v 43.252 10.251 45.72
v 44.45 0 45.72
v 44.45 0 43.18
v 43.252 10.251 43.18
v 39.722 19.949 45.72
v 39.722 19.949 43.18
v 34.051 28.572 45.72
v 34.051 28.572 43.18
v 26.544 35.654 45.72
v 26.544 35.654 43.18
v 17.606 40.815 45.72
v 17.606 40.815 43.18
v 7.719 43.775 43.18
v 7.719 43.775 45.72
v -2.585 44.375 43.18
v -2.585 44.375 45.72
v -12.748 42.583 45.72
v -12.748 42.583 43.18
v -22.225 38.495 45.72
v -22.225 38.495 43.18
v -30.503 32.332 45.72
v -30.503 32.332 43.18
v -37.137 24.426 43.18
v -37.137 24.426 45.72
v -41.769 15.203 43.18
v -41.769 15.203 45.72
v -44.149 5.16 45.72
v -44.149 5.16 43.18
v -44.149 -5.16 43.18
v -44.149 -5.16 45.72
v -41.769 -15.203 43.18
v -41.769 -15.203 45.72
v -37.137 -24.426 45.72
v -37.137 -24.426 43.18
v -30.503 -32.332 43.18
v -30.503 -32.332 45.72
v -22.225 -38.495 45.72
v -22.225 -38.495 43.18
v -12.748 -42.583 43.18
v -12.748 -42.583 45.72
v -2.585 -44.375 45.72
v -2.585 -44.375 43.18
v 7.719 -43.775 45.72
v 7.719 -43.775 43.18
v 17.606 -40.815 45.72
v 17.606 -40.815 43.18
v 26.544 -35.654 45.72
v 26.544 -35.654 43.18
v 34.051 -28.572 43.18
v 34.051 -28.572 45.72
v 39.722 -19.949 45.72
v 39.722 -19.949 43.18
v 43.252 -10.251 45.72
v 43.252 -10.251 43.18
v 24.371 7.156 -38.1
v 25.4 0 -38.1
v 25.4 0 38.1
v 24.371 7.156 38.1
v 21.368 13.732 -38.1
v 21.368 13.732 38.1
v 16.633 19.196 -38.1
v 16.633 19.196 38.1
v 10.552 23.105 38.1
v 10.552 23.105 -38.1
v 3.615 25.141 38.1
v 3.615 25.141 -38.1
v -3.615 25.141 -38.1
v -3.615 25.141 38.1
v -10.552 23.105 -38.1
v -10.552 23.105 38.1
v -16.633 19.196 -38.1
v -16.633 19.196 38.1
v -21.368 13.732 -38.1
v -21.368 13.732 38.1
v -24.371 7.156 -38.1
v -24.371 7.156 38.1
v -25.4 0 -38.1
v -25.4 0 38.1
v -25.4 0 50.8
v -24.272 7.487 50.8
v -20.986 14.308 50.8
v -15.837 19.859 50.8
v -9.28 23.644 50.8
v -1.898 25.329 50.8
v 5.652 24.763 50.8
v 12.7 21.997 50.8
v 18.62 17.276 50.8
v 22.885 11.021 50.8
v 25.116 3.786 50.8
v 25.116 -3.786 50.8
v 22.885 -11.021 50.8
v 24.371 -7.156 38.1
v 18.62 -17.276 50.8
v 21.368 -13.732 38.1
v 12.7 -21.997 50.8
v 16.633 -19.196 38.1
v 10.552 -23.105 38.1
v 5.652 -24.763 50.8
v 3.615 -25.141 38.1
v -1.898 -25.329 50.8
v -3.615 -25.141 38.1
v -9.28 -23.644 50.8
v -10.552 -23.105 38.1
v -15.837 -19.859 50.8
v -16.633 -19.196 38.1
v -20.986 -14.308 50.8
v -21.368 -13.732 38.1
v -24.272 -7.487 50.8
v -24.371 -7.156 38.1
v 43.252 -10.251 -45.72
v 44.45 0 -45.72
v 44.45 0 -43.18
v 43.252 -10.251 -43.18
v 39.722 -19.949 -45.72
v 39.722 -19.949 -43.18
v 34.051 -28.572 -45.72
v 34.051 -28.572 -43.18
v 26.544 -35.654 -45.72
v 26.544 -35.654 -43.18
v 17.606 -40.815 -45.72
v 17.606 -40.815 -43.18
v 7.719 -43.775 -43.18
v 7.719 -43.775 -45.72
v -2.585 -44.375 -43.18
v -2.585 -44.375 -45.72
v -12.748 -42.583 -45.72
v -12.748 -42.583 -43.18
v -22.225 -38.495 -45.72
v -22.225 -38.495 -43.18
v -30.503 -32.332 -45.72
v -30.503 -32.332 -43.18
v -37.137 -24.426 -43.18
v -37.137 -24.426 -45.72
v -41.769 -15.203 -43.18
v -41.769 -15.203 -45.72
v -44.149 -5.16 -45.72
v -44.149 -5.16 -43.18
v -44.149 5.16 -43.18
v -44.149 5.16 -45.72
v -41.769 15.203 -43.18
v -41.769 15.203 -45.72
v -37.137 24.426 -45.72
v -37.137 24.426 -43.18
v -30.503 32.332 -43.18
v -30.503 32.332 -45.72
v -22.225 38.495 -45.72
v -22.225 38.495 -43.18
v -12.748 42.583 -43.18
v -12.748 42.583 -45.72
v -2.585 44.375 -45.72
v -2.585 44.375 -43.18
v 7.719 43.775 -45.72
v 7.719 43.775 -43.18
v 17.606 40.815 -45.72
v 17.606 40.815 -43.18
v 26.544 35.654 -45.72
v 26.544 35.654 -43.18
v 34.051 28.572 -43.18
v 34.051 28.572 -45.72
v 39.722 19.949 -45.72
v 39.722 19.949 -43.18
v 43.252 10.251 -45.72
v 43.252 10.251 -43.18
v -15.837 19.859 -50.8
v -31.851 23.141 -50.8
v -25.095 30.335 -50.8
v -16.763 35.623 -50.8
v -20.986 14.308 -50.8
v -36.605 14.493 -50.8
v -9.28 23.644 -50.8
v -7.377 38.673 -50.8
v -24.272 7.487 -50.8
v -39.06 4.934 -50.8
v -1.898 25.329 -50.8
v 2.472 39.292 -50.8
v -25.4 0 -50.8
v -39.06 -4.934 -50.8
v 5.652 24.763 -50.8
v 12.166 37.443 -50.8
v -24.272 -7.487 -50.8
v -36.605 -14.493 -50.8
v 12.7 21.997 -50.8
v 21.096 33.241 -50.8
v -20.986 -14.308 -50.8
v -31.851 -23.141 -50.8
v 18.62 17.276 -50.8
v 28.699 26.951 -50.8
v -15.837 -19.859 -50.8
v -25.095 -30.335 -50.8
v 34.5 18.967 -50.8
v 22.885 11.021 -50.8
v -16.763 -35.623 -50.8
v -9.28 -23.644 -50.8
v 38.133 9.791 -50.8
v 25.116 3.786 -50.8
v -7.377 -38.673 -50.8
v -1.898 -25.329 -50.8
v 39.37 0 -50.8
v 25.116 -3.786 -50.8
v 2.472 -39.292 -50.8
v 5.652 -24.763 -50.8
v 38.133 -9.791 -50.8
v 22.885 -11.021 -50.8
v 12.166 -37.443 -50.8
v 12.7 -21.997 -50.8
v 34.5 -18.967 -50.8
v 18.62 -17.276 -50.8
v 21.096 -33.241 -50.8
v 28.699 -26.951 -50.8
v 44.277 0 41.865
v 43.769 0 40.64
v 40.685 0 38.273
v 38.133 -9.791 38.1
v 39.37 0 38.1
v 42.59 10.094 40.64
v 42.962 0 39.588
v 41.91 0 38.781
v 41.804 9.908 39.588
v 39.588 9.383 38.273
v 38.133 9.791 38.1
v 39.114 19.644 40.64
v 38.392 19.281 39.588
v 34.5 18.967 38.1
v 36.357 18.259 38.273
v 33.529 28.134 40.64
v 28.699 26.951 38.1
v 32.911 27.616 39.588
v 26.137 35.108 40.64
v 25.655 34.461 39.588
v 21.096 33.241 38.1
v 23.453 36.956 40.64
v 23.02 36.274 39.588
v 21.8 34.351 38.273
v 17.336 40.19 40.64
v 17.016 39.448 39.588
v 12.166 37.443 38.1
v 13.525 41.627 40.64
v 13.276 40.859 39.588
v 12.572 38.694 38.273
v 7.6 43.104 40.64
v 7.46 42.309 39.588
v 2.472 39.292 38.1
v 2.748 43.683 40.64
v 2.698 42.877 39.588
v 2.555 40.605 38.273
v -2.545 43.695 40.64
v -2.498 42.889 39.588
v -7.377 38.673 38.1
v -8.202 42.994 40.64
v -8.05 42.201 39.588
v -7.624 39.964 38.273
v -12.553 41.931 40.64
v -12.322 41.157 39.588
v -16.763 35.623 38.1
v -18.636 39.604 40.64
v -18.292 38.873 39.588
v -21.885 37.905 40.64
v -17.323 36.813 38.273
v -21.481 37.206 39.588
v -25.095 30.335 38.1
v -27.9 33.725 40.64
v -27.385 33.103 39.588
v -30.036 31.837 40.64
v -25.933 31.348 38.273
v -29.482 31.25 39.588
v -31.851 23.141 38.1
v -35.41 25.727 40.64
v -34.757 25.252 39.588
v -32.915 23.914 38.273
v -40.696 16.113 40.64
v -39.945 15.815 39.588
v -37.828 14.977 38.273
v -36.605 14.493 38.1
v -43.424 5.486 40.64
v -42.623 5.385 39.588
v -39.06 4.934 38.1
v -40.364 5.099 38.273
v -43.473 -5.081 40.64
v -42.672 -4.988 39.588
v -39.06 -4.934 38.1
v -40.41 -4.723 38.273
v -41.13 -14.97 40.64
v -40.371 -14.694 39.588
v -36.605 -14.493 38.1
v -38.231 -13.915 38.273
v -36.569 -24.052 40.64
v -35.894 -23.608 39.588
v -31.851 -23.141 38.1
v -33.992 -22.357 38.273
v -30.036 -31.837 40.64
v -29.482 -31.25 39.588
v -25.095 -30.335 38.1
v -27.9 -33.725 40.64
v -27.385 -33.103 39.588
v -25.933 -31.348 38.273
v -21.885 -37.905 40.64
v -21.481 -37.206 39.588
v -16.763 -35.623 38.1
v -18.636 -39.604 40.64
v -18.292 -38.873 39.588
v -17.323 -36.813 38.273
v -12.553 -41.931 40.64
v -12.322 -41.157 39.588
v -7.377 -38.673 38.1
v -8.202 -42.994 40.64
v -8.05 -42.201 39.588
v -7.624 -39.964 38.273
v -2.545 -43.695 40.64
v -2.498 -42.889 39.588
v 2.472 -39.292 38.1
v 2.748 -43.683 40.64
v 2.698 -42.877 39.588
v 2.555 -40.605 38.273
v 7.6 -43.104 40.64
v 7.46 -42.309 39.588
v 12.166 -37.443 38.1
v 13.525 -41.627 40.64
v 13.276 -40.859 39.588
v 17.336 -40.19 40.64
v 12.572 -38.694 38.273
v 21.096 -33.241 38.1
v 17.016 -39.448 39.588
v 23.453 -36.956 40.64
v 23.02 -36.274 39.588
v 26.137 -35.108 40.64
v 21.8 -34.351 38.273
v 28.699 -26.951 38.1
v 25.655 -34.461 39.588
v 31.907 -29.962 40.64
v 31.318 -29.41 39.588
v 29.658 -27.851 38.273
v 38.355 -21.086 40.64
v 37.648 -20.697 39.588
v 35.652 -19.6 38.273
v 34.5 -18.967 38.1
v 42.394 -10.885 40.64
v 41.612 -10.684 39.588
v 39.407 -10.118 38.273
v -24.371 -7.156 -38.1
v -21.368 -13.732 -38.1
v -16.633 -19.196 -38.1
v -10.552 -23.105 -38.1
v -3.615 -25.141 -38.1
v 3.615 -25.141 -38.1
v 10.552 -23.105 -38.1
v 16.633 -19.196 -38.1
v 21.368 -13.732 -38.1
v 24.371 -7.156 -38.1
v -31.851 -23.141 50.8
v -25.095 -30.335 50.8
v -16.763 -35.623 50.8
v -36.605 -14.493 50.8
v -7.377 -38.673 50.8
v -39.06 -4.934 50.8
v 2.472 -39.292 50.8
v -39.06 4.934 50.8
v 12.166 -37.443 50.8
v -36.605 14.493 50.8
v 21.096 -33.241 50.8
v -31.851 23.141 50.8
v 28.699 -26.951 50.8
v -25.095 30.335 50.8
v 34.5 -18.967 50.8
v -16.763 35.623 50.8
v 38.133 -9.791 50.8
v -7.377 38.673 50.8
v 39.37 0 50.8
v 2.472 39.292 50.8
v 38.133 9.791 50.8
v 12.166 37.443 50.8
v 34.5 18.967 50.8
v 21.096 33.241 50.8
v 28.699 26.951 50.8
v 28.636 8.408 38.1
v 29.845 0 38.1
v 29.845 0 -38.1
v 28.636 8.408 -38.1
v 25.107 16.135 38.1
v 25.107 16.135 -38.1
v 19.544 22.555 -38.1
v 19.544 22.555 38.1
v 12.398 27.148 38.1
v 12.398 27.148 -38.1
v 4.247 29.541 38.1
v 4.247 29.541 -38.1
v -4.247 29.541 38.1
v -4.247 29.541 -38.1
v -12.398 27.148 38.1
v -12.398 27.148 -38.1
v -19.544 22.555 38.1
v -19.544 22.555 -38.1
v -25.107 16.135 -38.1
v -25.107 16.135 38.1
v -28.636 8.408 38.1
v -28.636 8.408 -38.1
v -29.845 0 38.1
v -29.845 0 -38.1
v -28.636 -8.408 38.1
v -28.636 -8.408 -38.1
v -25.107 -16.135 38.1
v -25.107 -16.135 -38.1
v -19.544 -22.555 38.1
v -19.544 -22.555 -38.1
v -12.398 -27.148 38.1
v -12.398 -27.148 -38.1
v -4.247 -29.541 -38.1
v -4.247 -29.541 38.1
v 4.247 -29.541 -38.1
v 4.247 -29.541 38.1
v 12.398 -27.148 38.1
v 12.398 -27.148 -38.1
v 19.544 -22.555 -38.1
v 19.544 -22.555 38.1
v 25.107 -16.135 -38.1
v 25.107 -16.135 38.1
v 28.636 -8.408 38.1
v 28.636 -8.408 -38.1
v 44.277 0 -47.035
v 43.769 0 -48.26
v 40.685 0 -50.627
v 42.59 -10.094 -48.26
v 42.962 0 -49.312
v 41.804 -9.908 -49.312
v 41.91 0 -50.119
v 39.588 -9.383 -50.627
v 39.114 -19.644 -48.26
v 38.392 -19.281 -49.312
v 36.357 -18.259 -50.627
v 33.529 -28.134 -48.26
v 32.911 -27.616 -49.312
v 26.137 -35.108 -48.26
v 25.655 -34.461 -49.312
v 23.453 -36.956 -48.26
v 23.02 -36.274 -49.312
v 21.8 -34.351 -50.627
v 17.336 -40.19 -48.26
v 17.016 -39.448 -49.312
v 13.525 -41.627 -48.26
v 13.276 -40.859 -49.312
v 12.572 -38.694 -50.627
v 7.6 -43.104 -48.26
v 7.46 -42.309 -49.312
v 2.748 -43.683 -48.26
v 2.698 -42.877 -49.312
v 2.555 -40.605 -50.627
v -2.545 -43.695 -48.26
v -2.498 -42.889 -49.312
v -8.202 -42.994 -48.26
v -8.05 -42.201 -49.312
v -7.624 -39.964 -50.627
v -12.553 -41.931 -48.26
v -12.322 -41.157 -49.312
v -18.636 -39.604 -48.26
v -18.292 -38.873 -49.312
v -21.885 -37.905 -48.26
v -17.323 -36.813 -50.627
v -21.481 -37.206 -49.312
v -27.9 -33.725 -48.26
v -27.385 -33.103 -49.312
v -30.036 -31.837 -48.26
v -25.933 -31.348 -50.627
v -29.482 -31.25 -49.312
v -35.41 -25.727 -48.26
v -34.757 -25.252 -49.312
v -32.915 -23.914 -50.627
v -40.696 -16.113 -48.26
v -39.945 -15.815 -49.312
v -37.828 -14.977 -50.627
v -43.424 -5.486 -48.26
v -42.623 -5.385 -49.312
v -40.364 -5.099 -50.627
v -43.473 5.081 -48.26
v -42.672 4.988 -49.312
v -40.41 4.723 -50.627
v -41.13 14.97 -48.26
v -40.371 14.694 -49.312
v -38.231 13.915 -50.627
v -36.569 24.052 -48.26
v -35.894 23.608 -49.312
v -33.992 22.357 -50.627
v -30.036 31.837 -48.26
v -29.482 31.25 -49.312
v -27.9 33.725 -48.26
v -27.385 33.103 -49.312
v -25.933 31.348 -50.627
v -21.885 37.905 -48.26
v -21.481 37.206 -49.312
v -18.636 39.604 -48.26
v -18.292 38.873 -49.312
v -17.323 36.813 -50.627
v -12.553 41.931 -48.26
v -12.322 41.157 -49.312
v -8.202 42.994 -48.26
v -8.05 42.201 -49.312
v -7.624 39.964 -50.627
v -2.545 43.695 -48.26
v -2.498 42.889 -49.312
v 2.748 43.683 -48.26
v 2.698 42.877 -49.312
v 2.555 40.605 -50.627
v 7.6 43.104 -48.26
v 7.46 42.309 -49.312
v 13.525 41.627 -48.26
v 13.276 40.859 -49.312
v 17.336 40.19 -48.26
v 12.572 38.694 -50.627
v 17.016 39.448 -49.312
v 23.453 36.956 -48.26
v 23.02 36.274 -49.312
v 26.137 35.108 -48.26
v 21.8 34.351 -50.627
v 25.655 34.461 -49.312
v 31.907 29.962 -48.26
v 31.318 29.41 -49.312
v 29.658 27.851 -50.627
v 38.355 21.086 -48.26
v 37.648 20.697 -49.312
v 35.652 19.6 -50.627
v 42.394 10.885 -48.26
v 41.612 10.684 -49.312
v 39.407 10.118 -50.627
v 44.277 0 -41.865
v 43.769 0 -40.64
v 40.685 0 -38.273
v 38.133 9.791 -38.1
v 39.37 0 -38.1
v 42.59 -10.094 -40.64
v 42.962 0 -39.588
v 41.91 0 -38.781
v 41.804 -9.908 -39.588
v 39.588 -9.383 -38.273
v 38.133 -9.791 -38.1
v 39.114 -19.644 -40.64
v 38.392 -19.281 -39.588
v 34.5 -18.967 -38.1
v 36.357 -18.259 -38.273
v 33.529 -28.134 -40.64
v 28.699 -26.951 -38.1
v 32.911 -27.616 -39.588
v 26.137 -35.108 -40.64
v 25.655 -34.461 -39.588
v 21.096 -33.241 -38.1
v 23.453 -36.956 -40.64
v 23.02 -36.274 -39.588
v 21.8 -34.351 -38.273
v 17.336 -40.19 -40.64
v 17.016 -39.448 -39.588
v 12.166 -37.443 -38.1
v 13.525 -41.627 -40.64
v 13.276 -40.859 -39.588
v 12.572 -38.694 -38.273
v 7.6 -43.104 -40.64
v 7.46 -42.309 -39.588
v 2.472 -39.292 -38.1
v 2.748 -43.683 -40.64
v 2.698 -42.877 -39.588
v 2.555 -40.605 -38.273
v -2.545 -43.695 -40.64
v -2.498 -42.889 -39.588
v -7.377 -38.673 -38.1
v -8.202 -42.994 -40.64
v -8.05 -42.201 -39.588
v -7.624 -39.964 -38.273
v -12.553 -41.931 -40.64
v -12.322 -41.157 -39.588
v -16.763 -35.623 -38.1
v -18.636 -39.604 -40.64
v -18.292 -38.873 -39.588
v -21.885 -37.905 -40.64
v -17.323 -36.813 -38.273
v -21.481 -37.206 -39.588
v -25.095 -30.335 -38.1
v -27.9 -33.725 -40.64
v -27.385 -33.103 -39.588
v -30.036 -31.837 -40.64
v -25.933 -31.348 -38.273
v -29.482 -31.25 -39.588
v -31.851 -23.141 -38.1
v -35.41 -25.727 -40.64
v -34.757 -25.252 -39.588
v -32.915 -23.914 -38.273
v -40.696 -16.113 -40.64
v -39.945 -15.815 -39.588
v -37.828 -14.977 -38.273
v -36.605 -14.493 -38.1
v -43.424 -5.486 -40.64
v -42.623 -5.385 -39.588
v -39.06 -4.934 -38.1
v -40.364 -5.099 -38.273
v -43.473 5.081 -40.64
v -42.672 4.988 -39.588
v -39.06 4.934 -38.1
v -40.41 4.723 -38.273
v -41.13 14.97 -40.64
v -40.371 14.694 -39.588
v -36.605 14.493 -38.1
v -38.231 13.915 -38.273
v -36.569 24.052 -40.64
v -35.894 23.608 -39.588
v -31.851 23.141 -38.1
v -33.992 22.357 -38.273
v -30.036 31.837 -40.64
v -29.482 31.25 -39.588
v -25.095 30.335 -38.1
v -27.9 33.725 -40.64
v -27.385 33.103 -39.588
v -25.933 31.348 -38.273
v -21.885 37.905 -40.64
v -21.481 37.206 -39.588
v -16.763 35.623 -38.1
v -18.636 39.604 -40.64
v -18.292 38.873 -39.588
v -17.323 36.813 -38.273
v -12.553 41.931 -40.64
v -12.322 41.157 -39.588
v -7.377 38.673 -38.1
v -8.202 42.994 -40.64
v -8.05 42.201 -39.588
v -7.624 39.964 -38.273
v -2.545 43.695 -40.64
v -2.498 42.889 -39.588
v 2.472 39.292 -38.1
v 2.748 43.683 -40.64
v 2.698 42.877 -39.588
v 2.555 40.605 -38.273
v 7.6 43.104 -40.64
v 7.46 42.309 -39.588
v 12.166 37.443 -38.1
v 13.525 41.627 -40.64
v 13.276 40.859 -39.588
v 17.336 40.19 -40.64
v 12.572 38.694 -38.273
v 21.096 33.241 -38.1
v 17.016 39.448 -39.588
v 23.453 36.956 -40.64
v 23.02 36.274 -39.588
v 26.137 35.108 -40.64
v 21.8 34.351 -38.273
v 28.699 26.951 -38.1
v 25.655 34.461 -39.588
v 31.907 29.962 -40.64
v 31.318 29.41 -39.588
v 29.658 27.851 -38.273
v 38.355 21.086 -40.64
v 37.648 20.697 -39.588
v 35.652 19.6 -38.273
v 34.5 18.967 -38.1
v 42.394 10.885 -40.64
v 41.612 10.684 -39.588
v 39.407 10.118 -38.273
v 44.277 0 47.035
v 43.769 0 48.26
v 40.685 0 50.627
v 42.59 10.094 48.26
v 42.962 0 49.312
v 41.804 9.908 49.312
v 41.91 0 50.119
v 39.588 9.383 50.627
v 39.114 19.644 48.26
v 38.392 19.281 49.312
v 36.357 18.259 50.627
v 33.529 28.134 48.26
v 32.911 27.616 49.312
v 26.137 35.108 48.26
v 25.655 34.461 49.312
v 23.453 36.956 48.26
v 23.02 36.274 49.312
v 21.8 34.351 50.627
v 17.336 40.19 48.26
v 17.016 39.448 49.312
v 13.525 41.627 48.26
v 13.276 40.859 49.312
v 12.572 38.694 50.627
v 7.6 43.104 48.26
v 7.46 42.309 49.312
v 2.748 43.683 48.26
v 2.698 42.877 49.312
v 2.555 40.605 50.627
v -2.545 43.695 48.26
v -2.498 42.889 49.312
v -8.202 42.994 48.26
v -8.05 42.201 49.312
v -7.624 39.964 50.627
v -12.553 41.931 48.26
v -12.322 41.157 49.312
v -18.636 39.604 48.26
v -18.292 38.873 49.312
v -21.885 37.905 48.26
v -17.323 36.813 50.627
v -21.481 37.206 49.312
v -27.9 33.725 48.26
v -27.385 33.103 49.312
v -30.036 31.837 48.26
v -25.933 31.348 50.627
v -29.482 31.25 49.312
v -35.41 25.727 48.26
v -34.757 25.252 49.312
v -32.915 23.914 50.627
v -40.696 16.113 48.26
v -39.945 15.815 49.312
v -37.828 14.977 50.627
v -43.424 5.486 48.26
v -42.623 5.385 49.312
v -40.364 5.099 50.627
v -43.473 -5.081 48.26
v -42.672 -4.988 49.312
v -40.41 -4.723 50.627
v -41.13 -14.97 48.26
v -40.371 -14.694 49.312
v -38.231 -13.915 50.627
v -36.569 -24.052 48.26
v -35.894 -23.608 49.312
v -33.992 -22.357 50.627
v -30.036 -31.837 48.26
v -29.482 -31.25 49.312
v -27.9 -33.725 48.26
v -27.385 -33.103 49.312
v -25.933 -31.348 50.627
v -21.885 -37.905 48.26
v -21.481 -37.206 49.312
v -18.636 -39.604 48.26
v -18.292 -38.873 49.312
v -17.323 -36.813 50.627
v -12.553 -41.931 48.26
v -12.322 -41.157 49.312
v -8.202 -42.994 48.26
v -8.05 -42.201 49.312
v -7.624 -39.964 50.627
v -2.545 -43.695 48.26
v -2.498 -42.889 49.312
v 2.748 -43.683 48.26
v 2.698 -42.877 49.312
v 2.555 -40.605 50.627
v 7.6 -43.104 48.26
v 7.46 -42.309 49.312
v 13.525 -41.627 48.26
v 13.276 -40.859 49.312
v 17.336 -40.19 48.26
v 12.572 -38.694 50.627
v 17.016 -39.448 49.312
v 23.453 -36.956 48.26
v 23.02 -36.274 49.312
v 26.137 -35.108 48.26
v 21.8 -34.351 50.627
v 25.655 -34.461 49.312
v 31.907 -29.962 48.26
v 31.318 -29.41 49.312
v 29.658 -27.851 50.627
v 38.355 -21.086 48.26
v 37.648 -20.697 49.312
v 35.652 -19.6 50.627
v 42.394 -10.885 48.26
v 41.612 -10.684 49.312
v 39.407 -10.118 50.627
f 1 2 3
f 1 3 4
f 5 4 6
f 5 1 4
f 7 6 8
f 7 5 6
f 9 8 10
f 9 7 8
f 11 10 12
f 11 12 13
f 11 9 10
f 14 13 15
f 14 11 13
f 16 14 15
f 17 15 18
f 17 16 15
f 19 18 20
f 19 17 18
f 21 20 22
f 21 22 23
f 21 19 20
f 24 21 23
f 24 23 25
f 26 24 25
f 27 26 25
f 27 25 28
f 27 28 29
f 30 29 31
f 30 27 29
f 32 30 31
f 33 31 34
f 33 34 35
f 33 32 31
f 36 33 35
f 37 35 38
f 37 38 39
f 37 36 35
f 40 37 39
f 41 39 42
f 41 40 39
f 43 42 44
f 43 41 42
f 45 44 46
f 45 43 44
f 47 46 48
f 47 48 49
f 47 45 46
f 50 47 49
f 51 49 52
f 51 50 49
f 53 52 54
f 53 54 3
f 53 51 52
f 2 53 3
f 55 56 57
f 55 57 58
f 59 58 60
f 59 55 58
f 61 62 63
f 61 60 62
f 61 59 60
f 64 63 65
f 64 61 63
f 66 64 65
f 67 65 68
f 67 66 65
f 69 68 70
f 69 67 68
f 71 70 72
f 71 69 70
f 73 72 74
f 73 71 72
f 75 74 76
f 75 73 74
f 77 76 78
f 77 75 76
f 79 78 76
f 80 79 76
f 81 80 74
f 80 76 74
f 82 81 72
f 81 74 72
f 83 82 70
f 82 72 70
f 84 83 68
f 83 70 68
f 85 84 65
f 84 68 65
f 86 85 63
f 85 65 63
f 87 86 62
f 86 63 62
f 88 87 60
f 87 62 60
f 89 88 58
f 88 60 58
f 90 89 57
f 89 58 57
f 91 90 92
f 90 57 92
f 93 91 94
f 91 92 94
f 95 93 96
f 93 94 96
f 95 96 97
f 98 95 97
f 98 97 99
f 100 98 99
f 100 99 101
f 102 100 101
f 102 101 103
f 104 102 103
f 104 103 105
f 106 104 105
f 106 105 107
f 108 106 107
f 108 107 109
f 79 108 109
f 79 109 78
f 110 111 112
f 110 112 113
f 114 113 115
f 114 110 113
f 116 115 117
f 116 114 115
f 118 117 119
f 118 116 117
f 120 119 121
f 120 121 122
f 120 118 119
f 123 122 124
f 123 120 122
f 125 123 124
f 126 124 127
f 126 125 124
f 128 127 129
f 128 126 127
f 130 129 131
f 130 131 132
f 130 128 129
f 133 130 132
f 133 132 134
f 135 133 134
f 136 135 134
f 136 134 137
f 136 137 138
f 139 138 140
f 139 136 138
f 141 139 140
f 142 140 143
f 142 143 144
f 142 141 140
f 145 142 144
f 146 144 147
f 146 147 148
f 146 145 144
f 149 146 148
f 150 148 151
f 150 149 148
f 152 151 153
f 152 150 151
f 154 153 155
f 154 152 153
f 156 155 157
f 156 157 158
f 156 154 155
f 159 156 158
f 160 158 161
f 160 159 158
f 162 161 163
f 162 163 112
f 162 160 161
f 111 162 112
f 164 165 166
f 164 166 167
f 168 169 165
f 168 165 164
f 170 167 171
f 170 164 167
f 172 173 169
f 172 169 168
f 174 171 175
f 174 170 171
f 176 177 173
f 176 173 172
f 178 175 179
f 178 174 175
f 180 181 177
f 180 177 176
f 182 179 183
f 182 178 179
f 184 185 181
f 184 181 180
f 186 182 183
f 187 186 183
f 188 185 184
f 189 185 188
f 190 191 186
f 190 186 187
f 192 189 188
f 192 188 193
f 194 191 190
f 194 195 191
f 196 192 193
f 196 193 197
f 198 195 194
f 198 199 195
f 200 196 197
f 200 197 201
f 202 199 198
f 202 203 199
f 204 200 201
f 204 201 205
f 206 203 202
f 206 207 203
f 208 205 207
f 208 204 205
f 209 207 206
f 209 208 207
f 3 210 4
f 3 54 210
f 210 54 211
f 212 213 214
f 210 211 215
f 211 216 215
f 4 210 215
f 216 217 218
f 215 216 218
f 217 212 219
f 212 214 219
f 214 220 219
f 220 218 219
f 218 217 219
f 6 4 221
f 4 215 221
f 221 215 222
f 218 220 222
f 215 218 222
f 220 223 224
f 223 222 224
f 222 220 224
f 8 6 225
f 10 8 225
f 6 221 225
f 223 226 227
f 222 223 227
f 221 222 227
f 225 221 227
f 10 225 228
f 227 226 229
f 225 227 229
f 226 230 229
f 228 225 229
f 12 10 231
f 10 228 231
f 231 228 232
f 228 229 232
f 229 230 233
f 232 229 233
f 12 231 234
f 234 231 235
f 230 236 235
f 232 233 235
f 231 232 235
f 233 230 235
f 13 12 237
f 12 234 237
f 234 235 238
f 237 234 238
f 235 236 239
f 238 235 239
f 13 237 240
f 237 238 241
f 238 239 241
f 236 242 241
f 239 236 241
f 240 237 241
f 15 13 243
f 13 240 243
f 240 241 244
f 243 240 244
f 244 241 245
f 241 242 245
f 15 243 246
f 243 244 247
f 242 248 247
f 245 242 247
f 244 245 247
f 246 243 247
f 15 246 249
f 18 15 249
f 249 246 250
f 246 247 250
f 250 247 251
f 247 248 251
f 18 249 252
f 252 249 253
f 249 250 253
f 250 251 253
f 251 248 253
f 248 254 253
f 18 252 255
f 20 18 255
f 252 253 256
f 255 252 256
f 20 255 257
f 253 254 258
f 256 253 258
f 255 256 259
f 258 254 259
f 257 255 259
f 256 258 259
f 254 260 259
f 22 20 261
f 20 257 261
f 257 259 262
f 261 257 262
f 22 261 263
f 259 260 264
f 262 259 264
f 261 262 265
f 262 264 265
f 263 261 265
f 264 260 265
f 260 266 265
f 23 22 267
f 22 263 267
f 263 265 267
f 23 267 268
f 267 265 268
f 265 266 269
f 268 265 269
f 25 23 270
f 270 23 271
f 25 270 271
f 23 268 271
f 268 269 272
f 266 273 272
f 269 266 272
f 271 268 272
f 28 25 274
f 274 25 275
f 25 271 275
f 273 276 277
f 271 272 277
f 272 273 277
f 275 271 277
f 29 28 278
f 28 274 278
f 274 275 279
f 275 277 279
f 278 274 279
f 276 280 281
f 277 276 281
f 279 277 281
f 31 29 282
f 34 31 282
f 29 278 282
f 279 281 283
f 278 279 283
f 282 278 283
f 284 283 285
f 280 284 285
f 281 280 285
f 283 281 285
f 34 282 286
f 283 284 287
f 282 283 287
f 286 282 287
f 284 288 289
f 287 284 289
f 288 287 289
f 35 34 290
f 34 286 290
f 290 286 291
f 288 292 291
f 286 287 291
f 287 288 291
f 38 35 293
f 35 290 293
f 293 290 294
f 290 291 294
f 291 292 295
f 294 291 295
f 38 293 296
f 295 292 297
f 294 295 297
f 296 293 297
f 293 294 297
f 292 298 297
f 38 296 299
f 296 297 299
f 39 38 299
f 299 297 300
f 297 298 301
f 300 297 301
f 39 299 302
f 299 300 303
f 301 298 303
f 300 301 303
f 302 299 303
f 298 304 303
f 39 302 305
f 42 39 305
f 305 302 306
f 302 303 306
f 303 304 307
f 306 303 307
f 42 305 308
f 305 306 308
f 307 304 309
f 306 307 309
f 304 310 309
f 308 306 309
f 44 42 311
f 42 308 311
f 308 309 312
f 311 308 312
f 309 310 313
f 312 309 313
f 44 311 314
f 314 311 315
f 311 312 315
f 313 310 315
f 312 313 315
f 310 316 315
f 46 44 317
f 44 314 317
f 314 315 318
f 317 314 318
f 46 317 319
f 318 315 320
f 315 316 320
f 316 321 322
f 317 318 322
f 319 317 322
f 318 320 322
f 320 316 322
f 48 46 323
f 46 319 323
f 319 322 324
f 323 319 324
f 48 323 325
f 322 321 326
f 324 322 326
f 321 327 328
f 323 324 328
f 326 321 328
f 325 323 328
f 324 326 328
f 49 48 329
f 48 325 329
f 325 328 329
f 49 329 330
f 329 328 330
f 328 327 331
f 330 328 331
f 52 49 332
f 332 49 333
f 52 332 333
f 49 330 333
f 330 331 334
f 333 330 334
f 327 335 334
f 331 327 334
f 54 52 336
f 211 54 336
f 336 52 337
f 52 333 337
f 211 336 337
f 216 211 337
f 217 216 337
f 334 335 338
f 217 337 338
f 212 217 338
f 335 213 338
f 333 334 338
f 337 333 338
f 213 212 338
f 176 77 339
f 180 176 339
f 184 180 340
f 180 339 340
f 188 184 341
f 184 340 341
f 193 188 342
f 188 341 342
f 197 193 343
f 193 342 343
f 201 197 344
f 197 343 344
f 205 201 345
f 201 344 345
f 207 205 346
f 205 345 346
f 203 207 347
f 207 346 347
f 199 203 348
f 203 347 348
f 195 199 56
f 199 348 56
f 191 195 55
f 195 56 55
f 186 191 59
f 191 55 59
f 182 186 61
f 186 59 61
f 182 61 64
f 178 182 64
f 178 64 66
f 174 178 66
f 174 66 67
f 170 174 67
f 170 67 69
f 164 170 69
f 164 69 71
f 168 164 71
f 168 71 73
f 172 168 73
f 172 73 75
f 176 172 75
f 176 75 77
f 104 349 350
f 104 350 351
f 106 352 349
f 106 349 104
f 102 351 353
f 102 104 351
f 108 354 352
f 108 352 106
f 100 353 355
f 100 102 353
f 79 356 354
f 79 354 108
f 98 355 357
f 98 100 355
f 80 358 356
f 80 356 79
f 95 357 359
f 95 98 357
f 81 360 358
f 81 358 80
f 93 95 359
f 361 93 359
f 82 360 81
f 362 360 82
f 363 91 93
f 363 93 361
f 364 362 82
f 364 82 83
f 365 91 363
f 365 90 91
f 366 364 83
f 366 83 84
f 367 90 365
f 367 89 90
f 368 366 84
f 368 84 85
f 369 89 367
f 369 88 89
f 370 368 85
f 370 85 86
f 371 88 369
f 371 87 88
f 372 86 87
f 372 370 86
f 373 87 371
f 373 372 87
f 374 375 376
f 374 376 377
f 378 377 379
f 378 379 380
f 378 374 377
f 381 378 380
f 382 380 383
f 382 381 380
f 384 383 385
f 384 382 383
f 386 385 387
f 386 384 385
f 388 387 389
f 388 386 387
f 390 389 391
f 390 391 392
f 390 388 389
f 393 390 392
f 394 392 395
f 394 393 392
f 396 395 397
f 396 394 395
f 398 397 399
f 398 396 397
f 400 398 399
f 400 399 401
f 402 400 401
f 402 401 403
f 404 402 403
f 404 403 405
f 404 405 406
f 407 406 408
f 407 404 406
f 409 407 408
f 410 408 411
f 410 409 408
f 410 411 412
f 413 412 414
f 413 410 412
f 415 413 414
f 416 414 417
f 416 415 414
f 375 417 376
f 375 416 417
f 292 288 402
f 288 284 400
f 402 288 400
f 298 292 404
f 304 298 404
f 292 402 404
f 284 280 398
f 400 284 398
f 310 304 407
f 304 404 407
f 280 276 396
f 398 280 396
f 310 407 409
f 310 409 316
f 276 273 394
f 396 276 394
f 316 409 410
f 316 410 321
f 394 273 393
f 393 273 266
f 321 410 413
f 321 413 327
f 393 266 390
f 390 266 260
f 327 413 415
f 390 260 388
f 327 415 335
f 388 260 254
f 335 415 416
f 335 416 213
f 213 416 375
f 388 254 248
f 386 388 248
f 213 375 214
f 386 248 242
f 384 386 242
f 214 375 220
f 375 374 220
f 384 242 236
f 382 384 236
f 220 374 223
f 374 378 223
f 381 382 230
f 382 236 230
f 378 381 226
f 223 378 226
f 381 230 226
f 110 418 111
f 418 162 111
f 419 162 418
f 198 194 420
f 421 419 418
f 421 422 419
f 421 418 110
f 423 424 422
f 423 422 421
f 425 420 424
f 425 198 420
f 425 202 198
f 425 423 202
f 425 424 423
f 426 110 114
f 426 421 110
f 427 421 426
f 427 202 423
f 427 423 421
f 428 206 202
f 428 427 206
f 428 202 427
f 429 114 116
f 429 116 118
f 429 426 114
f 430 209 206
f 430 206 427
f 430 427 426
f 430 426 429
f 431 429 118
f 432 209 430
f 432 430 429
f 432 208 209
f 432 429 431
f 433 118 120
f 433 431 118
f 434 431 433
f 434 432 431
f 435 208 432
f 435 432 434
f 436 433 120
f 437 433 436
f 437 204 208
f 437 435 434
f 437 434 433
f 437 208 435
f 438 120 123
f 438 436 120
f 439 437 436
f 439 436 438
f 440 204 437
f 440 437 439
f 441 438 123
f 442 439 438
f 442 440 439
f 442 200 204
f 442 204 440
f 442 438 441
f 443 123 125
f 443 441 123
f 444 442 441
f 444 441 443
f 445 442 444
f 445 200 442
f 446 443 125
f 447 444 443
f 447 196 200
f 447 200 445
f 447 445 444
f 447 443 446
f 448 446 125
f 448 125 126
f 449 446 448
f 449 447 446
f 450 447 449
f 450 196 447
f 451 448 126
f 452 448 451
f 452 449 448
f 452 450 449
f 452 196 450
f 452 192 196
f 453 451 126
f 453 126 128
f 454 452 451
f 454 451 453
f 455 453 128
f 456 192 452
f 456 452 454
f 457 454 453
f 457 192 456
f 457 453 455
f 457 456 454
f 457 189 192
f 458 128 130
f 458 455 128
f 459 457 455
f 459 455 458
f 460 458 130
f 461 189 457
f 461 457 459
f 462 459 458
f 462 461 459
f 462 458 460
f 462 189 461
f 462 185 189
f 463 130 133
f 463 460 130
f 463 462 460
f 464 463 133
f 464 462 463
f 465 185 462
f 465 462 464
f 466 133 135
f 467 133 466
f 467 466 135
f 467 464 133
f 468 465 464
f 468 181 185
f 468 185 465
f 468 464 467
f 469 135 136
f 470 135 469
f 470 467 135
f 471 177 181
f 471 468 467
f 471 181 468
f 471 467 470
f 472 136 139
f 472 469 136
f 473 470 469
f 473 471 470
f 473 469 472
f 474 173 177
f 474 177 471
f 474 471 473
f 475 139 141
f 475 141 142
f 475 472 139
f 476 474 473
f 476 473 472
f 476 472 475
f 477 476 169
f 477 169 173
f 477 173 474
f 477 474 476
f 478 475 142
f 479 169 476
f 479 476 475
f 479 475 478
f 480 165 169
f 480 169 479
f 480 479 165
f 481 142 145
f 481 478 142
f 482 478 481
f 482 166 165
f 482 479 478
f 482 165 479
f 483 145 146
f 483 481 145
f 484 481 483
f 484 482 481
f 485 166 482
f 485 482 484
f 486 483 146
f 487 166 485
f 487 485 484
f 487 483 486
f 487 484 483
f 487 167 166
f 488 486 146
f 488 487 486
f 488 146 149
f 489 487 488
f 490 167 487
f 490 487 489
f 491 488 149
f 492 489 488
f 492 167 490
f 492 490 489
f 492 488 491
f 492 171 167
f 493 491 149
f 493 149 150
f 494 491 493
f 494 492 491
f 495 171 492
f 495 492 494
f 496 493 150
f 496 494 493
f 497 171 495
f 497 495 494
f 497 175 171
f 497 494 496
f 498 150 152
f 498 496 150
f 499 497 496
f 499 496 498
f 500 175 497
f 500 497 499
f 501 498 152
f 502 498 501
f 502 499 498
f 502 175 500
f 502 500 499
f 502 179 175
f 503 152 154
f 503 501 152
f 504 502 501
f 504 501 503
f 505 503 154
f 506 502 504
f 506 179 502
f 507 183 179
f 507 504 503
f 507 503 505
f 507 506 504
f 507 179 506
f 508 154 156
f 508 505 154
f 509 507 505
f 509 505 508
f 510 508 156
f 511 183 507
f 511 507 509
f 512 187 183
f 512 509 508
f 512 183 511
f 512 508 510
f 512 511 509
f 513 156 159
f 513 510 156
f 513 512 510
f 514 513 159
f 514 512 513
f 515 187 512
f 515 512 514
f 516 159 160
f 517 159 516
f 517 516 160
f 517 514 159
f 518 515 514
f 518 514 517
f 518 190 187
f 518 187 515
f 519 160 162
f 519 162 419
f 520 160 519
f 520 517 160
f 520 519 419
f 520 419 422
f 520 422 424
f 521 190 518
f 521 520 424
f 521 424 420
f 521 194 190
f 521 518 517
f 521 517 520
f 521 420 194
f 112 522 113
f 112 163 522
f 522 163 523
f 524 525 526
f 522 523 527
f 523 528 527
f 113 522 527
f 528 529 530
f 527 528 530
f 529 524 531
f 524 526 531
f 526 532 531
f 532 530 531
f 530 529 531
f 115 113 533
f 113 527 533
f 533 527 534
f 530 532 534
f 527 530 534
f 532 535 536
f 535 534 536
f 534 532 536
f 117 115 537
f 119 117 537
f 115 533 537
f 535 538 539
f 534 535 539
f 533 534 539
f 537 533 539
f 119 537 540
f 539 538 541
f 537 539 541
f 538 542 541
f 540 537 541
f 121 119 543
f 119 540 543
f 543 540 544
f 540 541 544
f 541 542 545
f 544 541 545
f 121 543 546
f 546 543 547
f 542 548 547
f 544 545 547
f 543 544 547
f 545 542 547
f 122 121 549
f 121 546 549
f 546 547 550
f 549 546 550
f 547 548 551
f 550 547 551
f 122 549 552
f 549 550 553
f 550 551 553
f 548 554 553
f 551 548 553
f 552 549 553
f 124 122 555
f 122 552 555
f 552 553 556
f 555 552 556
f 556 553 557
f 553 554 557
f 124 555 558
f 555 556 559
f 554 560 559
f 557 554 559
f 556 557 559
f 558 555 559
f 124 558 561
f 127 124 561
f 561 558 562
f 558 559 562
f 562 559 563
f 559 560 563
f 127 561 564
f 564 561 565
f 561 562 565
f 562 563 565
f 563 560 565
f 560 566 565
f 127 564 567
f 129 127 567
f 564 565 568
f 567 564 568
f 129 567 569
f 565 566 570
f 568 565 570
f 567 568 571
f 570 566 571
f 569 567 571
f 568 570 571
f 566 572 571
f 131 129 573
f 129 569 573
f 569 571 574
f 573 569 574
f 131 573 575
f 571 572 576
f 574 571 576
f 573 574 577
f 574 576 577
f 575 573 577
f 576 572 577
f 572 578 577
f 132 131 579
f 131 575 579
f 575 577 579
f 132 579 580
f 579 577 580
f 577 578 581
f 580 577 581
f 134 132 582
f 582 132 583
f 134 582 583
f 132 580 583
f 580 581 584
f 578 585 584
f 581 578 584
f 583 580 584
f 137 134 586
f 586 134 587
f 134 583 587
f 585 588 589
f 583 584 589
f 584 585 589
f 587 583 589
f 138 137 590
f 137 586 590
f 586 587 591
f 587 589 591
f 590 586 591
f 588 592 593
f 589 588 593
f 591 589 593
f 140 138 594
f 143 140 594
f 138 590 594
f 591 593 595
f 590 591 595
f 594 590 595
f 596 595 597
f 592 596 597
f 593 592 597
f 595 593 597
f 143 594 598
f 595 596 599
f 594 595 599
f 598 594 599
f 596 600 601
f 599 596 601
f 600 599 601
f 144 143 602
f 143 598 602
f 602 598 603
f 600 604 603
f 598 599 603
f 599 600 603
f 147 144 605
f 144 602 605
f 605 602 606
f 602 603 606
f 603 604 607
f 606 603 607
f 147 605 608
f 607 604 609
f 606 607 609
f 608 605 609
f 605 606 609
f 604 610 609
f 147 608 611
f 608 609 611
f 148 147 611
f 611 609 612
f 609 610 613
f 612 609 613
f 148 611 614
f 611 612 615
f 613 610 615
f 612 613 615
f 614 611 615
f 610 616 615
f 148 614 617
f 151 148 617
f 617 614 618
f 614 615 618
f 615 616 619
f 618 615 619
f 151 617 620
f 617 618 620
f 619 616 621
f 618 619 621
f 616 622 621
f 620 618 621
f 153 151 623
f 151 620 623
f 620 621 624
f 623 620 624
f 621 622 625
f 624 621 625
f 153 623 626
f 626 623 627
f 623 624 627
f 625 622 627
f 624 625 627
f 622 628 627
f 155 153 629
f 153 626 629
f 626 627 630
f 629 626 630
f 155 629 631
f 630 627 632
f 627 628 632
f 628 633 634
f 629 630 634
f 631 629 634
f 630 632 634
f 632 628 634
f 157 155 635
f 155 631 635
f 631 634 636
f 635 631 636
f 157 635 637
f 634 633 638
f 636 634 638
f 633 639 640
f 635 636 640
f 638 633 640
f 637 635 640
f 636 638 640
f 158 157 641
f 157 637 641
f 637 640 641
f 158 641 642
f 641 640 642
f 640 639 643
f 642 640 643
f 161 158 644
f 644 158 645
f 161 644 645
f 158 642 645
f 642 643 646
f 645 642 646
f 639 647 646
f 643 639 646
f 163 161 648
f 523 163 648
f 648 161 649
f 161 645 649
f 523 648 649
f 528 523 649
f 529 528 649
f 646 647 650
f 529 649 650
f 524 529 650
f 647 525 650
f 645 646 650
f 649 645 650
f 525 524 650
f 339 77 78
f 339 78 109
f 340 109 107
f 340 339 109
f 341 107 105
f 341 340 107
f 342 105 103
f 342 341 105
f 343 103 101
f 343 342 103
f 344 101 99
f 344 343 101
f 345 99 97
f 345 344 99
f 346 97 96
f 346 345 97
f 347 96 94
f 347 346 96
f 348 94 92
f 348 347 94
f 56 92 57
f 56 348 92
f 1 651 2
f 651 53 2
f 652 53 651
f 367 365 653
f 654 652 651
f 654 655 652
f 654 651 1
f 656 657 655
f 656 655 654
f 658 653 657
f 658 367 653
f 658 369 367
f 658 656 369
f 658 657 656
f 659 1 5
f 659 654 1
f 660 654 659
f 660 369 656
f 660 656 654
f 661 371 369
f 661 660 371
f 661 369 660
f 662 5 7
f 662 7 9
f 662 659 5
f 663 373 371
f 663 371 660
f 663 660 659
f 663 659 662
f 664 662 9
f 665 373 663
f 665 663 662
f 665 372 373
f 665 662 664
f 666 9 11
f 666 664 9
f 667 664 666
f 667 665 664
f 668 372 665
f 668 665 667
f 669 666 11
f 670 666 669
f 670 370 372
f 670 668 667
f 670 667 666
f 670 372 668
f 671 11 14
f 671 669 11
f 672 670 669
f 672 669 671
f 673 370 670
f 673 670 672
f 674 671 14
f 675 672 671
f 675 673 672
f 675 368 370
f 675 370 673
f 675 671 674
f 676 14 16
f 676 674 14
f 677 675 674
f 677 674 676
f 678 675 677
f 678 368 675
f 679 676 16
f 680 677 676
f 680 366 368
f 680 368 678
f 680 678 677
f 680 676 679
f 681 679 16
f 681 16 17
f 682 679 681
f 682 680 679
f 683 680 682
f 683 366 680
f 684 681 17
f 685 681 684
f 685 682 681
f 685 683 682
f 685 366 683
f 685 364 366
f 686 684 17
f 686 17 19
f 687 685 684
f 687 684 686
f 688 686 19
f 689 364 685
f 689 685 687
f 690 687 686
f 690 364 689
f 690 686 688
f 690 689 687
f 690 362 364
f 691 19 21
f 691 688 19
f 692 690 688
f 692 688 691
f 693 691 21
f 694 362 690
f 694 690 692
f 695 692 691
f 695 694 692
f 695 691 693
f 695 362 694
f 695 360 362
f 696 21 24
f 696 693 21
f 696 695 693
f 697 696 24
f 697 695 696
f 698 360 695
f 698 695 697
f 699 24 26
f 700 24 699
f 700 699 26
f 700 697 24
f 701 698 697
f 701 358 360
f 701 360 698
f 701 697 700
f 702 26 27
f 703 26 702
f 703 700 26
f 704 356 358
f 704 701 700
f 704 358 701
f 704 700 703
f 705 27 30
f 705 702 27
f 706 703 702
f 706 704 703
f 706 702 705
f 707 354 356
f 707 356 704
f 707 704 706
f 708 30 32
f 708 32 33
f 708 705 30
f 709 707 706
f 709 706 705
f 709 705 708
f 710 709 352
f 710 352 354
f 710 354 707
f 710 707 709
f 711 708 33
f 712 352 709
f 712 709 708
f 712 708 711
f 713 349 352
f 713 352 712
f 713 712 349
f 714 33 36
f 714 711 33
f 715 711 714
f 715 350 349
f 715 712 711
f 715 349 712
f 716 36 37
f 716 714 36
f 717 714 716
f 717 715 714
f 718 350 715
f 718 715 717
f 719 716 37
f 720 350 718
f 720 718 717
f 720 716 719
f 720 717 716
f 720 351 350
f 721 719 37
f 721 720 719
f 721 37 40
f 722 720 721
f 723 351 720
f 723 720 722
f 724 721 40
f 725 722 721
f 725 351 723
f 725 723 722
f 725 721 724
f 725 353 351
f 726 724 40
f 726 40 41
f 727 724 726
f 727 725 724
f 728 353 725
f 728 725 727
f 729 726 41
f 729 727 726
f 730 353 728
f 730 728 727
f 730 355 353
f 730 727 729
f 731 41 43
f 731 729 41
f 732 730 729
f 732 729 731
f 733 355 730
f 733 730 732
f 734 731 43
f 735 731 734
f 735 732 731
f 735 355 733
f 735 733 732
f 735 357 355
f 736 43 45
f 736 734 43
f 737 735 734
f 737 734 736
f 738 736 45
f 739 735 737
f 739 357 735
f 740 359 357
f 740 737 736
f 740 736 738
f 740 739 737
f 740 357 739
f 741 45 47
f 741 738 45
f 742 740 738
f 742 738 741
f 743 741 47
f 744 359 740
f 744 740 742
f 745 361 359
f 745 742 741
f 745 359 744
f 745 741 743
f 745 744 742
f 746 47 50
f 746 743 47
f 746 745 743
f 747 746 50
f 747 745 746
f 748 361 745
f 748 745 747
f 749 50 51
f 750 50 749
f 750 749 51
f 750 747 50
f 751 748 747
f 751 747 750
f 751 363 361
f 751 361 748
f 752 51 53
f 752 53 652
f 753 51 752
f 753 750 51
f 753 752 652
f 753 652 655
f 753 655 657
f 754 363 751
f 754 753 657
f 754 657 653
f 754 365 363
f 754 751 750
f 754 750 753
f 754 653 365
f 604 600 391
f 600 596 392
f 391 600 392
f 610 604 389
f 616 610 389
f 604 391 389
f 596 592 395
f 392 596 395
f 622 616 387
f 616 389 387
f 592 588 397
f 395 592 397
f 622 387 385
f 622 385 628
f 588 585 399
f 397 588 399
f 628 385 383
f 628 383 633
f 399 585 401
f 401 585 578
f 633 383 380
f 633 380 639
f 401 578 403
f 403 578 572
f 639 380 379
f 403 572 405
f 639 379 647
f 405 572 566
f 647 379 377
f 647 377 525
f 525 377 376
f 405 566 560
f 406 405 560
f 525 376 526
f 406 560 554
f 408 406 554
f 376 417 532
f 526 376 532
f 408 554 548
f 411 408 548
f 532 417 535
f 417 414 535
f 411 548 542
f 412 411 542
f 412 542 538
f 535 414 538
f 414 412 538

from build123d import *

# Parameters (mm, degrees)
F0_R     = 29.845
F0_R_2   = 25.4
F1_DEPTH = 50.8
F2_R     = 44.45
F3_DEPTH = 12.7
F4_R     = 5.08
F6_D     = 50.8
F7_R     = 44.45
F8_DEPTH = 12.7
F9_R     = 5.08
F11_D    = 50.8


with BuildPart() as f1:
    # F0 (on Top) → F1 (new body, symmetric)
    with BuildSketch(Plane.XY):
        Circle(F0_R)
        Circle(F0_R_2, mode=Mode.SUBTRACT)
    extrude(amount=F1_DEPTH, both=True)

    # F2 (on face) → F3 (join)
    with BuildSketch(Plane(origin=(0, 0, -50.8), x_dir=(1, 0, 0), z_dir=(0, 0, -1))):
        Circle(F2_R)
    extrude(amount=-F3_DEPTH)

    # F4
    f4_edges = [f1.edges().sort_by_distance(p)[0] for p in [
        (44.45, 0, -44.45),
        (-44.45, 0, -50.8),
        (-44.45, 0, -38.1),
    ]]
    fillet(f4_edges, radius=F4_R)

    # F6 (through all)
    with Locations(Plane(origin=(0, 0, -50.8), x_dir=(1, 0, 0), z_dir=(0, 0, -1))):
        with Locations((0, 0)):
            Hole(F6_D / 2)

    # F7 (on face) → F8 (join)
    with BuildSketch(Plane.XY.offset(50.8)):
        Circle(F7_R)
    extrude(amount=-F8_DEPTH)

    # F9
    f9_edges = [f1.edges().sort_by_distance(p)[0] for p in [
        (44.45, 0, 44.45),
        (-44.45, 0, 50.8),
        (-44.45, 0, 38.1),
    ]]
    fillet(f9_edges, radius=F9_R)

    # F11 (through all)
    with Locations(Plane.XY.offset(50.8)):
        with Locations((0, 0)):
            Hole(F11_D / 2)


solid = f1.part
